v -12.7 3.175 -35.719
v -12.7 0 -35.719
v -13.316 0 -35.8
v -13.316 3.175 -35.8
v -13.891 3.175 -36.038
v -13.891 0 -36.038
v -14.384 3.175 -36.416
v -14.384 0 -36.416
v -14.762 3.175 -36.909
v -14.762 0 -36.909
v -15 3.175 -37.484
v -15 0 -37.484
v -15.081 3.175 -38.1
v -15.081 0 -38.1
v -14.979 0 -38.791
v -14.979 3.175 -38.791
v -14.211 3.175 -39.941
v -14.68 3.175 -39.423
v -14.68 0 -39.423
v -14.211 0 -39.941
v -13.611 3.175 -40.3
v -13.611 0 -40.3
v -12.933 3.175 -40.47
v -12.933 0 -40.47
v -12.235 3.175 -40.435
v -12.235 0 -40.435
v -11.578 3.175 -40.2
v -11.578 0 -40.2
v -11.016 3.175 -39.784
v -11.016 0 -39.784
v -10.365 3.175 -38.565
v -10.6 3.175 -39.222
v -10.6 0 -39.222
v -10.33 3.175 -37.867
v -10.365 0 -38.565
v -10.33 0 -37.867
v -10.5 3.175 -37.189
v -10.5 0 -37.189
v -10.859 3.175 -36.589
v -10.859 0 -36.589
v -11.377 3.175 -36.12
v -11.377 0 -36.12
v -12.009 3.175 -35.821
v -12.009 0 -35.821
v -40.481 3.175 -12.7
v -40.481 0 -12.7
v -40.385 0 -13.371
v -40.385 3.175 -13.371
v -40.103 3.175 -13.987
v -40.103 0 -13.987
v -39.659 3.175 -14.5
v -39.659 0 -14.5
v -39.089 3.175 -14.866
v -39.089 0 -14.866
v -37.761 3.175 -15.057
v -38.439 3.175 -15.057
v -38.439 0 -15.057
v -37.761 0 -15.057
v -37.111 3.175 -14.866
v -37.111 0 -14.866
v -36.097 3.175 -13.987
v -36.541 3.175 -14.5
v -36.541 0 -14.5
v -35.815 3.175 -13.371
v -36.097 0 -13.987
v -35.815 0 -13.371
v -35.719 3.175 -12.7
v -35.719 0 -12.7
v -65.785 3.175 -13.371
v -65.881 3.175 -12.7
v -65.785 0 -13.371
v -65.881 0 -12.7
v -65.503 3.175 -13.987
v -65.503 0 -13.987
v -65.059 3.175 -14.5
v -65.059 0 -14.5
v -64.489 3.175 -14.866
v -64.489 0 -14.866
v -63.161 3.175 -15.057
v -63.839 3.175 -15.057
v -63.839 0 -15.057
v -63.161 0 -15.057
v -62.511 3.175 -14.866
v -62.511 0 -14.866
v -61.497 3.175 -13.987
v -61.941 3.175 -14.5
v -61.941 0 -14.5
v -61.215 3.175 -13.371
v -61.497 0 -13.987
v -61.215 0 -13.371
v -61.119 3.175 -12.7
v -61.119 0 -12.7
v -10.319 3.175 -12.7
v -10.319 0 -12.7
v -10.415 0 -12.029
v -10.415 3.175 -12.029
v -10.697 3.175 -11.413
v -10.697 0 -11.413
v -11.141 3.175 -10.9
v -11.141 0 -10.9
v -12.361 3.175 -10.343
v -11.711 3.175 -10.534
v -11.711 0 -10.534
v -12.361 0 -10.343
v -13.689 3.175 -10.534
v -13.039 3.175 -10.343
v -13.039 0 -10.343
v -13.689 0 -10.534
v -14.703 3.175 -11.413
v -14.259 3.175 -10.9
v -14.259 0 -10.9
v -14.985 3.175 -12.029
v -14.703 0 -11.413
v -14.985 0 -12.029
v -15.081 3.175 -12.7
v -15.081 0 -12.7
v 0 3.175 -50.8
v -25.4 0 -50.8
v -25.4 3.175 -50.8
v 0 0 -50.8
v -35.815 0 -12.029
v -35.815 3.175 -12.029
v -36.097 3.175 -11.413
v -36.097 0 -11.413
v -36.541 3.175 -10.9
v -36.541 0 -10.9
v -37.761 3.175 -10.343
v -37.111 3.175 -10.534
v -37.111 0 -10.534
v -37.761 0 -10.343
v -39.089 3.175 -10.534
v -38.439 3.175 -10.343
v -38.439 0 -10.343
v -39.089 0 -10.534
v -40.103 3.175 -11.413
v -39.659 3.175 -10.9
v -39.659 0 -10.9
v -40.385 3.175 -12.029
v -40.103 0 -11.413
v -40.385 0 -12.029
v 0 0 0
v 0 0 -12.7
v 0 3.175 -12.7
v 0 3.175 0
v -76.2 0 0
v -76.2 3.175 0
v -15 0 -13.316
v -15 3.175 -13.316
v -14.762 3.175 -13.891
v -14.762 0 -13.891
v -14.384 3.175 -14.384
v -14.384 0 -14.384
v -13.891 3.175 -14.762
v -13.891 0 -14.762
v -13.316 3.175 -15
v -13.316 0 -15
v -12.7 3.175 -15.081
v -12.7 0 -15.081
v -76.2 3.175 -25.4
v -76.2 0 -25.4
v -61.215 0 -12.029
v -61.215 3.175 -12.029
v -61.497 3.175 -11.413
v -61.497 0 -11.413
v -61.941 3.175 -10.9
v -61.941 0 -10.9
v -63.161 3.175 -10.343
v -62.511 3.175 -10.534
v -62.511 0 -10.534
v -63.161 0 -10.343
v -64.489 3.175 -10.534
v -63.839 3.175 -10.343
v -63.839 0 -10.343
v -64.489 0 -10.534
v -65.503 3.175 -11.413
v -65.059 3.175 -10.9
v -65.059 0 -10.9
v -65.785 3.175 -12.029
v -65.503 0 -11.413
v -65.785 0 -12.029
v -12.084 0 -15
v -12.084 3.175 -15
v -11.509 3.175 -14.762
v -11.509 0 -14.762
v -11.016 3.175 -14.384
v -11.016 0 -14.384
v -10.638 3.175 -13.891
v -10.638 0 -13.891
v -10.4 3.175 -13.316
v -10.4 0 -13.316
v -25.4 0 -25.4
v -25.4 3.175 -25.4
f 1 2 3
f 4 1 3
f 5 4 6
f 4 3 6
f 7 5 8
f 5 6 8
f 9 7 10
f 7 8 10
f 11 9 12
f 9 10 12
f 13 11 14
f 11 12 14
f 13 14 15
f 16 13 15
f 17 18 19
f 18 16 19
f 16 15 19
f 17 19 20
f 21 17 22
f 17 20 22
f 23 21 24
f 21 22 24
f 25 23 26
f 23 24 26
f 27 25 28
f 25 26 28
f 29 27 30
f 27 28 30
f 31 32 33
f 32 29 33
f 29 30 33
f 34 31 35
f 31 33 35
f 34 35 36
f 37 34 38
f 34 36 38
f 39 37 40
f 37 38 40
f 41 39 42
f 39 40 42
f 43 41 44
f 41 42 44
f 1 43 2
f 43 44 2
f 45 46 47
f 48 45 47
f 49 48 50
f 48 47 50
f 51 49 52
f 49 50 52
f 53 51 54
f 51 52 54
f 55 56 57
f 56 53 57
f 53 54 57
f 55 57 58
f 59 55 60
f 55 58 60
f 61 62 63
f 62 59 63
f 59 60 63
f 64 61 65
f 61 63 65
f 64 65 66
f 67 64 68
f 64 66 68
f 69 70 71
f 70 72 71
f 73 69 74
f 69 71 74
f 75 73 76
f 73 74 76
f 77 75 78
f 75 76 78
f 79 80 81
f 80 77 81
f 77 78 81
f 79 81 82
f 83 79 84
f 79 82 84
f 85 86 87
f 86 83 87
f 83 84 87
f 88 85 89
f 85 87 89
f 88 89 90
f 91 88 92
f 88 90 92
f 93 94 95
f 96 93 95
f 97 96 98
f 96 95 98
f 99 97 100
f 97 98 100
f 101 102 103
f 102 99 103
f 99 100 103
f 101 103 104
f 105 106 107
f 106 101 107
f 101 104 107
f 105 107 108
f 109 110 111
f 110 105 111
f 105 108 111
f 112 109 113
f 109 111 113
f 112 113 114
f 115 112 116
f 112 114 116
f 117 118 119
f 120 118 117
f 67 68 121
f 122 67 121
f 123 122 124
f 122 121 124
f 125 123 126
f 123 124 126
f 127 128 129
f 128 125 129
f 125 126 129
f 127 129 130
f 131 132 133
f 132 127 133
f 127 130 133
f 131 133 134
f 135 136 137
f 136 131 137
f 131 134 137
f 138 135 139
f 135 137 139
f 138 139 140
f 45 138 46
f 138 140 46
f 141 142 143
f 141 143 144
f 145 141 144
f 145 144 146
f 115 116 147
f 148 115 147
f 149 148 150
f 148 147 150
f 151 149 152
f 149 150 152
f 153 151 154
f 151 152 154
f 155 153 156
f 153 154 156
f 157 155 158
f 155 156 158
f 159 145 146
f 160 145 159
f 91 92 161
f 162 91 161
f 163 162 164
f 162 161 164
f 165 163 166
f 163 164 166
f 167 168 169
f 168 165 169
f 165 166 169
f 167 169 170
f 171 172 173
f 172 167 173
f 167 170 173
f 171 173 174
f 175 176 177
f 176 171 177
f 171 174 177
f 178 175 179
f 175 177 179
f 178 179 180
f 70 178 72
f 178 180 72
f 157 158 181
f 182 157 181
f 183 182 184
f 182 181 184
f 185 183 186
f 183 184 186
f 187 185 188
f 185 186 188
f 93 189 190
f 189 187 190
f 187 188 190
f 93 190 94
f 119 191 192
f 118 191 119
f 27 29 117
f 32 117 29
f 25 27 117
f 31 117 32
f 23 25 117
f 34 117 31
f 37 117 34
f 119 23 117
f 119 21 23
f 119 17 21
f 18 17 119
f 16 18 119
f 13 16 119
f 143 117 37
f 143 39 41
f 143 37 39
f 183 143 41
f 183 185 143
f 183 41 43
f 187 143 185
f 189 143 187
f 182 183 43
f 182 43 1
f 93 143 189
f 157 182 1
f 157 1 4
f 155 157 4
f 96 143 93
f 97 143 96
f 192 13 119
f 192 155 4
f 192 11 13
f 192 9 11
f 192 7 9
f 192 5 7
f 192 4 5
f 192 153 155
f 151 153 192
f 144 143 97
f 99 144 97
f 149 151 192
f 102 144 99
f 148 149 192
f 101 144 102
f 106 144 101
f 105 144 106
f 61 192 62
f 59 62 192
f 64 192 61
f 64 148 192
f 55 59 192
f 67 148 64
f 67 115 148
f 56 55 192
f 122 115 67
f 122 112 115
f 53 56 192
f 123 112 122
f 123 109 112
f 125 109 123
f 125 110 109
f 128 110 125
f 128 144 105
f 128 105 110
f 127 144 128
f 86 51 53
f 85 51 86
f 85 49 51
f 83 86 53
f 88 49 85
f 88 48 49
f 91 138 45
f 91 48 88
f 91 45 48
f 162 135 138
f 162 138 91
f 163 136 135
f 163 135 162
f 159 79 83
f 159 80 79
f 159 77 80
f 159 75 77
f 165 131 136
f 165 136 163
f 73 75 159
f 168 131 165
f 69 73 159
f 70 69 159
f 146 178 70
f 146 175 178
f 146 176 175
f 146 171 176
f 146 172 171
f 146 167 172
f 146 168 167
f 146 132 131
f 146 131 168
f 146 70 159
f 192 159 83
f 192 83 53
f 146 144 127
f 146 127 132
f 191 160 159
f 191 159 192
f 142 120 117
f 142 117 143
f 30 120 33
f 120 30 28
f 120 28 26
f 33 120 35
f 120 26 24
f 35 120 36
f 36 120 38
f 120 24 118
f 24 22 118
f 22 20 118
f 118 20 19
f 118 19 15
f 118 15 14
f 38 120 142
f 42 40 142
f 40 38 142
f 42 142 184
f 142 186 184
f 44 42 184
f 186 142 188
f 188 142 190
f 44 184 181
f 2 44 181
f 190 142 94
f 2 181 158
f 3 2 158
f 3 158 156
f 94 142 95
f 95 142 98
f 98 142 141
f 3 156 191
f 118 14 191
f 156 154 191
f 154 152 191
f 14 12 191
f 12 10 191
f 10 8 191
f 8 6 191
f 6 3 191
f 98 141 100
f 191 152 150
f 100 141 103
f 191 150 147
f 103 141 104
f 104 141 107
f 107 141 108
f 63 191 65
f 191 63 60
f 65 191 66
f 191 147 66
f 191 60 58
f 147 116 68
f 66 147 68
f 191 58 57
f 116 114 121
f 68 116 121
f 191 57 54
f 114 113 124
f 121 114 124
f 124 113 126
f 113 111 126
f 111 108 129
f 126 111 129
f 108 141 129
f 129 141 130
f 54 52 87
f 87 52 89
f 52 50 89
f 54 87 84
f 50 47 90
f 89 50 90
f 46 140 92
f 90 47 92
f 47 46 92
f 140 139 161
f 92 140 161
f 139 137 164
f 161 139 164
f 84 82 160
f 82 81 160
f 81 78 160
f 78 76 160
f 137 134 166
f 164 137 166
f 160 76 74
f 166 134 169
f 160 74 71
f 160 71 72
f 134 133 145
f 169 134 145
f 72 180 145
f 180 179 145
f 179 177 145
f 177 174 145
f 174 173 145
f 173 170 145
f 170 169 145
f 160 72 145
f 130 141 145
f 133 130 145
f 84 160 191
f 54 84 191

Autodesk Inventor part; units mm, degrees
ref_plane "YZ Plane" through (0, 0, 0) normal (1, 0, 0) x (0, 1, 0)
ref_plane "XZ Plane" through (0, 0, 0) normal (0, 1, 0) x (-1, 0, 0)
ref_plane "XY Plane" through (0, 0, 0) normal (0, 0, 1) x (1, 0, 0)
sketch "Sketch1" plane through (0, 0, 0) normal (0, 1, 0) x (-1, 0, 0)
  line L0 (0, 0) -> (76.2, 0)
  line L1 (76.2, 0) -> (76.2, -25.4)
  line L2 (76.2, -25.4) -> (25.4, -25.4)
  line L3 (25.4, -25.4) -> (25.4, -50.8)
  line L4 (25.4, -50.8) -> (0, -50.8)
  line L5 (0, -50.8) -> (0, 0)
  line L6 (0, 0) -> (0, -12.7)
  line L7 (0, -12.7) -> (12.7, -12.7)
  circle A0 centre (12.7, -12.7) radius 2.3813
  line L8 (12.7, -12.7) -> (12.7, -38.1)
  circle A1 centre (12.7, -38.1) radius 2.3812
  line L9 (12.7, -12.7) -> (38.1, -12.7)
  circle A2 centre (38.1, -12.7) radius 2.3812
  line L10 (38.1, -12.7) -> (63.5, -12.7)
  circle A3 centre (63.5, -12.7) radius 2.3813
  dimension "d9" = 76.2
  dimension "d10" = 25.4
  dimension "d11" = 50.8
  dimension "d12" = 25.4
  dimension "d13" = 25.4
  dimension "d14" = 50.8
  dimension "d15" = 12.7
  dimension "d16" = 12.7
  dimension "d17" = 4.7625
  dimension "d18" = 25.4
  dimension "d19" = 4.7625
  dimension "d20" = 25.4
  dimension "d21" = 4.7625
  dimension "d22" = 25.4
  dimension "d23" = 4.7625
extrude "Extrusion1" add sketch "Sketch1" along normal blind 3.175
properties part number "LPlate"
